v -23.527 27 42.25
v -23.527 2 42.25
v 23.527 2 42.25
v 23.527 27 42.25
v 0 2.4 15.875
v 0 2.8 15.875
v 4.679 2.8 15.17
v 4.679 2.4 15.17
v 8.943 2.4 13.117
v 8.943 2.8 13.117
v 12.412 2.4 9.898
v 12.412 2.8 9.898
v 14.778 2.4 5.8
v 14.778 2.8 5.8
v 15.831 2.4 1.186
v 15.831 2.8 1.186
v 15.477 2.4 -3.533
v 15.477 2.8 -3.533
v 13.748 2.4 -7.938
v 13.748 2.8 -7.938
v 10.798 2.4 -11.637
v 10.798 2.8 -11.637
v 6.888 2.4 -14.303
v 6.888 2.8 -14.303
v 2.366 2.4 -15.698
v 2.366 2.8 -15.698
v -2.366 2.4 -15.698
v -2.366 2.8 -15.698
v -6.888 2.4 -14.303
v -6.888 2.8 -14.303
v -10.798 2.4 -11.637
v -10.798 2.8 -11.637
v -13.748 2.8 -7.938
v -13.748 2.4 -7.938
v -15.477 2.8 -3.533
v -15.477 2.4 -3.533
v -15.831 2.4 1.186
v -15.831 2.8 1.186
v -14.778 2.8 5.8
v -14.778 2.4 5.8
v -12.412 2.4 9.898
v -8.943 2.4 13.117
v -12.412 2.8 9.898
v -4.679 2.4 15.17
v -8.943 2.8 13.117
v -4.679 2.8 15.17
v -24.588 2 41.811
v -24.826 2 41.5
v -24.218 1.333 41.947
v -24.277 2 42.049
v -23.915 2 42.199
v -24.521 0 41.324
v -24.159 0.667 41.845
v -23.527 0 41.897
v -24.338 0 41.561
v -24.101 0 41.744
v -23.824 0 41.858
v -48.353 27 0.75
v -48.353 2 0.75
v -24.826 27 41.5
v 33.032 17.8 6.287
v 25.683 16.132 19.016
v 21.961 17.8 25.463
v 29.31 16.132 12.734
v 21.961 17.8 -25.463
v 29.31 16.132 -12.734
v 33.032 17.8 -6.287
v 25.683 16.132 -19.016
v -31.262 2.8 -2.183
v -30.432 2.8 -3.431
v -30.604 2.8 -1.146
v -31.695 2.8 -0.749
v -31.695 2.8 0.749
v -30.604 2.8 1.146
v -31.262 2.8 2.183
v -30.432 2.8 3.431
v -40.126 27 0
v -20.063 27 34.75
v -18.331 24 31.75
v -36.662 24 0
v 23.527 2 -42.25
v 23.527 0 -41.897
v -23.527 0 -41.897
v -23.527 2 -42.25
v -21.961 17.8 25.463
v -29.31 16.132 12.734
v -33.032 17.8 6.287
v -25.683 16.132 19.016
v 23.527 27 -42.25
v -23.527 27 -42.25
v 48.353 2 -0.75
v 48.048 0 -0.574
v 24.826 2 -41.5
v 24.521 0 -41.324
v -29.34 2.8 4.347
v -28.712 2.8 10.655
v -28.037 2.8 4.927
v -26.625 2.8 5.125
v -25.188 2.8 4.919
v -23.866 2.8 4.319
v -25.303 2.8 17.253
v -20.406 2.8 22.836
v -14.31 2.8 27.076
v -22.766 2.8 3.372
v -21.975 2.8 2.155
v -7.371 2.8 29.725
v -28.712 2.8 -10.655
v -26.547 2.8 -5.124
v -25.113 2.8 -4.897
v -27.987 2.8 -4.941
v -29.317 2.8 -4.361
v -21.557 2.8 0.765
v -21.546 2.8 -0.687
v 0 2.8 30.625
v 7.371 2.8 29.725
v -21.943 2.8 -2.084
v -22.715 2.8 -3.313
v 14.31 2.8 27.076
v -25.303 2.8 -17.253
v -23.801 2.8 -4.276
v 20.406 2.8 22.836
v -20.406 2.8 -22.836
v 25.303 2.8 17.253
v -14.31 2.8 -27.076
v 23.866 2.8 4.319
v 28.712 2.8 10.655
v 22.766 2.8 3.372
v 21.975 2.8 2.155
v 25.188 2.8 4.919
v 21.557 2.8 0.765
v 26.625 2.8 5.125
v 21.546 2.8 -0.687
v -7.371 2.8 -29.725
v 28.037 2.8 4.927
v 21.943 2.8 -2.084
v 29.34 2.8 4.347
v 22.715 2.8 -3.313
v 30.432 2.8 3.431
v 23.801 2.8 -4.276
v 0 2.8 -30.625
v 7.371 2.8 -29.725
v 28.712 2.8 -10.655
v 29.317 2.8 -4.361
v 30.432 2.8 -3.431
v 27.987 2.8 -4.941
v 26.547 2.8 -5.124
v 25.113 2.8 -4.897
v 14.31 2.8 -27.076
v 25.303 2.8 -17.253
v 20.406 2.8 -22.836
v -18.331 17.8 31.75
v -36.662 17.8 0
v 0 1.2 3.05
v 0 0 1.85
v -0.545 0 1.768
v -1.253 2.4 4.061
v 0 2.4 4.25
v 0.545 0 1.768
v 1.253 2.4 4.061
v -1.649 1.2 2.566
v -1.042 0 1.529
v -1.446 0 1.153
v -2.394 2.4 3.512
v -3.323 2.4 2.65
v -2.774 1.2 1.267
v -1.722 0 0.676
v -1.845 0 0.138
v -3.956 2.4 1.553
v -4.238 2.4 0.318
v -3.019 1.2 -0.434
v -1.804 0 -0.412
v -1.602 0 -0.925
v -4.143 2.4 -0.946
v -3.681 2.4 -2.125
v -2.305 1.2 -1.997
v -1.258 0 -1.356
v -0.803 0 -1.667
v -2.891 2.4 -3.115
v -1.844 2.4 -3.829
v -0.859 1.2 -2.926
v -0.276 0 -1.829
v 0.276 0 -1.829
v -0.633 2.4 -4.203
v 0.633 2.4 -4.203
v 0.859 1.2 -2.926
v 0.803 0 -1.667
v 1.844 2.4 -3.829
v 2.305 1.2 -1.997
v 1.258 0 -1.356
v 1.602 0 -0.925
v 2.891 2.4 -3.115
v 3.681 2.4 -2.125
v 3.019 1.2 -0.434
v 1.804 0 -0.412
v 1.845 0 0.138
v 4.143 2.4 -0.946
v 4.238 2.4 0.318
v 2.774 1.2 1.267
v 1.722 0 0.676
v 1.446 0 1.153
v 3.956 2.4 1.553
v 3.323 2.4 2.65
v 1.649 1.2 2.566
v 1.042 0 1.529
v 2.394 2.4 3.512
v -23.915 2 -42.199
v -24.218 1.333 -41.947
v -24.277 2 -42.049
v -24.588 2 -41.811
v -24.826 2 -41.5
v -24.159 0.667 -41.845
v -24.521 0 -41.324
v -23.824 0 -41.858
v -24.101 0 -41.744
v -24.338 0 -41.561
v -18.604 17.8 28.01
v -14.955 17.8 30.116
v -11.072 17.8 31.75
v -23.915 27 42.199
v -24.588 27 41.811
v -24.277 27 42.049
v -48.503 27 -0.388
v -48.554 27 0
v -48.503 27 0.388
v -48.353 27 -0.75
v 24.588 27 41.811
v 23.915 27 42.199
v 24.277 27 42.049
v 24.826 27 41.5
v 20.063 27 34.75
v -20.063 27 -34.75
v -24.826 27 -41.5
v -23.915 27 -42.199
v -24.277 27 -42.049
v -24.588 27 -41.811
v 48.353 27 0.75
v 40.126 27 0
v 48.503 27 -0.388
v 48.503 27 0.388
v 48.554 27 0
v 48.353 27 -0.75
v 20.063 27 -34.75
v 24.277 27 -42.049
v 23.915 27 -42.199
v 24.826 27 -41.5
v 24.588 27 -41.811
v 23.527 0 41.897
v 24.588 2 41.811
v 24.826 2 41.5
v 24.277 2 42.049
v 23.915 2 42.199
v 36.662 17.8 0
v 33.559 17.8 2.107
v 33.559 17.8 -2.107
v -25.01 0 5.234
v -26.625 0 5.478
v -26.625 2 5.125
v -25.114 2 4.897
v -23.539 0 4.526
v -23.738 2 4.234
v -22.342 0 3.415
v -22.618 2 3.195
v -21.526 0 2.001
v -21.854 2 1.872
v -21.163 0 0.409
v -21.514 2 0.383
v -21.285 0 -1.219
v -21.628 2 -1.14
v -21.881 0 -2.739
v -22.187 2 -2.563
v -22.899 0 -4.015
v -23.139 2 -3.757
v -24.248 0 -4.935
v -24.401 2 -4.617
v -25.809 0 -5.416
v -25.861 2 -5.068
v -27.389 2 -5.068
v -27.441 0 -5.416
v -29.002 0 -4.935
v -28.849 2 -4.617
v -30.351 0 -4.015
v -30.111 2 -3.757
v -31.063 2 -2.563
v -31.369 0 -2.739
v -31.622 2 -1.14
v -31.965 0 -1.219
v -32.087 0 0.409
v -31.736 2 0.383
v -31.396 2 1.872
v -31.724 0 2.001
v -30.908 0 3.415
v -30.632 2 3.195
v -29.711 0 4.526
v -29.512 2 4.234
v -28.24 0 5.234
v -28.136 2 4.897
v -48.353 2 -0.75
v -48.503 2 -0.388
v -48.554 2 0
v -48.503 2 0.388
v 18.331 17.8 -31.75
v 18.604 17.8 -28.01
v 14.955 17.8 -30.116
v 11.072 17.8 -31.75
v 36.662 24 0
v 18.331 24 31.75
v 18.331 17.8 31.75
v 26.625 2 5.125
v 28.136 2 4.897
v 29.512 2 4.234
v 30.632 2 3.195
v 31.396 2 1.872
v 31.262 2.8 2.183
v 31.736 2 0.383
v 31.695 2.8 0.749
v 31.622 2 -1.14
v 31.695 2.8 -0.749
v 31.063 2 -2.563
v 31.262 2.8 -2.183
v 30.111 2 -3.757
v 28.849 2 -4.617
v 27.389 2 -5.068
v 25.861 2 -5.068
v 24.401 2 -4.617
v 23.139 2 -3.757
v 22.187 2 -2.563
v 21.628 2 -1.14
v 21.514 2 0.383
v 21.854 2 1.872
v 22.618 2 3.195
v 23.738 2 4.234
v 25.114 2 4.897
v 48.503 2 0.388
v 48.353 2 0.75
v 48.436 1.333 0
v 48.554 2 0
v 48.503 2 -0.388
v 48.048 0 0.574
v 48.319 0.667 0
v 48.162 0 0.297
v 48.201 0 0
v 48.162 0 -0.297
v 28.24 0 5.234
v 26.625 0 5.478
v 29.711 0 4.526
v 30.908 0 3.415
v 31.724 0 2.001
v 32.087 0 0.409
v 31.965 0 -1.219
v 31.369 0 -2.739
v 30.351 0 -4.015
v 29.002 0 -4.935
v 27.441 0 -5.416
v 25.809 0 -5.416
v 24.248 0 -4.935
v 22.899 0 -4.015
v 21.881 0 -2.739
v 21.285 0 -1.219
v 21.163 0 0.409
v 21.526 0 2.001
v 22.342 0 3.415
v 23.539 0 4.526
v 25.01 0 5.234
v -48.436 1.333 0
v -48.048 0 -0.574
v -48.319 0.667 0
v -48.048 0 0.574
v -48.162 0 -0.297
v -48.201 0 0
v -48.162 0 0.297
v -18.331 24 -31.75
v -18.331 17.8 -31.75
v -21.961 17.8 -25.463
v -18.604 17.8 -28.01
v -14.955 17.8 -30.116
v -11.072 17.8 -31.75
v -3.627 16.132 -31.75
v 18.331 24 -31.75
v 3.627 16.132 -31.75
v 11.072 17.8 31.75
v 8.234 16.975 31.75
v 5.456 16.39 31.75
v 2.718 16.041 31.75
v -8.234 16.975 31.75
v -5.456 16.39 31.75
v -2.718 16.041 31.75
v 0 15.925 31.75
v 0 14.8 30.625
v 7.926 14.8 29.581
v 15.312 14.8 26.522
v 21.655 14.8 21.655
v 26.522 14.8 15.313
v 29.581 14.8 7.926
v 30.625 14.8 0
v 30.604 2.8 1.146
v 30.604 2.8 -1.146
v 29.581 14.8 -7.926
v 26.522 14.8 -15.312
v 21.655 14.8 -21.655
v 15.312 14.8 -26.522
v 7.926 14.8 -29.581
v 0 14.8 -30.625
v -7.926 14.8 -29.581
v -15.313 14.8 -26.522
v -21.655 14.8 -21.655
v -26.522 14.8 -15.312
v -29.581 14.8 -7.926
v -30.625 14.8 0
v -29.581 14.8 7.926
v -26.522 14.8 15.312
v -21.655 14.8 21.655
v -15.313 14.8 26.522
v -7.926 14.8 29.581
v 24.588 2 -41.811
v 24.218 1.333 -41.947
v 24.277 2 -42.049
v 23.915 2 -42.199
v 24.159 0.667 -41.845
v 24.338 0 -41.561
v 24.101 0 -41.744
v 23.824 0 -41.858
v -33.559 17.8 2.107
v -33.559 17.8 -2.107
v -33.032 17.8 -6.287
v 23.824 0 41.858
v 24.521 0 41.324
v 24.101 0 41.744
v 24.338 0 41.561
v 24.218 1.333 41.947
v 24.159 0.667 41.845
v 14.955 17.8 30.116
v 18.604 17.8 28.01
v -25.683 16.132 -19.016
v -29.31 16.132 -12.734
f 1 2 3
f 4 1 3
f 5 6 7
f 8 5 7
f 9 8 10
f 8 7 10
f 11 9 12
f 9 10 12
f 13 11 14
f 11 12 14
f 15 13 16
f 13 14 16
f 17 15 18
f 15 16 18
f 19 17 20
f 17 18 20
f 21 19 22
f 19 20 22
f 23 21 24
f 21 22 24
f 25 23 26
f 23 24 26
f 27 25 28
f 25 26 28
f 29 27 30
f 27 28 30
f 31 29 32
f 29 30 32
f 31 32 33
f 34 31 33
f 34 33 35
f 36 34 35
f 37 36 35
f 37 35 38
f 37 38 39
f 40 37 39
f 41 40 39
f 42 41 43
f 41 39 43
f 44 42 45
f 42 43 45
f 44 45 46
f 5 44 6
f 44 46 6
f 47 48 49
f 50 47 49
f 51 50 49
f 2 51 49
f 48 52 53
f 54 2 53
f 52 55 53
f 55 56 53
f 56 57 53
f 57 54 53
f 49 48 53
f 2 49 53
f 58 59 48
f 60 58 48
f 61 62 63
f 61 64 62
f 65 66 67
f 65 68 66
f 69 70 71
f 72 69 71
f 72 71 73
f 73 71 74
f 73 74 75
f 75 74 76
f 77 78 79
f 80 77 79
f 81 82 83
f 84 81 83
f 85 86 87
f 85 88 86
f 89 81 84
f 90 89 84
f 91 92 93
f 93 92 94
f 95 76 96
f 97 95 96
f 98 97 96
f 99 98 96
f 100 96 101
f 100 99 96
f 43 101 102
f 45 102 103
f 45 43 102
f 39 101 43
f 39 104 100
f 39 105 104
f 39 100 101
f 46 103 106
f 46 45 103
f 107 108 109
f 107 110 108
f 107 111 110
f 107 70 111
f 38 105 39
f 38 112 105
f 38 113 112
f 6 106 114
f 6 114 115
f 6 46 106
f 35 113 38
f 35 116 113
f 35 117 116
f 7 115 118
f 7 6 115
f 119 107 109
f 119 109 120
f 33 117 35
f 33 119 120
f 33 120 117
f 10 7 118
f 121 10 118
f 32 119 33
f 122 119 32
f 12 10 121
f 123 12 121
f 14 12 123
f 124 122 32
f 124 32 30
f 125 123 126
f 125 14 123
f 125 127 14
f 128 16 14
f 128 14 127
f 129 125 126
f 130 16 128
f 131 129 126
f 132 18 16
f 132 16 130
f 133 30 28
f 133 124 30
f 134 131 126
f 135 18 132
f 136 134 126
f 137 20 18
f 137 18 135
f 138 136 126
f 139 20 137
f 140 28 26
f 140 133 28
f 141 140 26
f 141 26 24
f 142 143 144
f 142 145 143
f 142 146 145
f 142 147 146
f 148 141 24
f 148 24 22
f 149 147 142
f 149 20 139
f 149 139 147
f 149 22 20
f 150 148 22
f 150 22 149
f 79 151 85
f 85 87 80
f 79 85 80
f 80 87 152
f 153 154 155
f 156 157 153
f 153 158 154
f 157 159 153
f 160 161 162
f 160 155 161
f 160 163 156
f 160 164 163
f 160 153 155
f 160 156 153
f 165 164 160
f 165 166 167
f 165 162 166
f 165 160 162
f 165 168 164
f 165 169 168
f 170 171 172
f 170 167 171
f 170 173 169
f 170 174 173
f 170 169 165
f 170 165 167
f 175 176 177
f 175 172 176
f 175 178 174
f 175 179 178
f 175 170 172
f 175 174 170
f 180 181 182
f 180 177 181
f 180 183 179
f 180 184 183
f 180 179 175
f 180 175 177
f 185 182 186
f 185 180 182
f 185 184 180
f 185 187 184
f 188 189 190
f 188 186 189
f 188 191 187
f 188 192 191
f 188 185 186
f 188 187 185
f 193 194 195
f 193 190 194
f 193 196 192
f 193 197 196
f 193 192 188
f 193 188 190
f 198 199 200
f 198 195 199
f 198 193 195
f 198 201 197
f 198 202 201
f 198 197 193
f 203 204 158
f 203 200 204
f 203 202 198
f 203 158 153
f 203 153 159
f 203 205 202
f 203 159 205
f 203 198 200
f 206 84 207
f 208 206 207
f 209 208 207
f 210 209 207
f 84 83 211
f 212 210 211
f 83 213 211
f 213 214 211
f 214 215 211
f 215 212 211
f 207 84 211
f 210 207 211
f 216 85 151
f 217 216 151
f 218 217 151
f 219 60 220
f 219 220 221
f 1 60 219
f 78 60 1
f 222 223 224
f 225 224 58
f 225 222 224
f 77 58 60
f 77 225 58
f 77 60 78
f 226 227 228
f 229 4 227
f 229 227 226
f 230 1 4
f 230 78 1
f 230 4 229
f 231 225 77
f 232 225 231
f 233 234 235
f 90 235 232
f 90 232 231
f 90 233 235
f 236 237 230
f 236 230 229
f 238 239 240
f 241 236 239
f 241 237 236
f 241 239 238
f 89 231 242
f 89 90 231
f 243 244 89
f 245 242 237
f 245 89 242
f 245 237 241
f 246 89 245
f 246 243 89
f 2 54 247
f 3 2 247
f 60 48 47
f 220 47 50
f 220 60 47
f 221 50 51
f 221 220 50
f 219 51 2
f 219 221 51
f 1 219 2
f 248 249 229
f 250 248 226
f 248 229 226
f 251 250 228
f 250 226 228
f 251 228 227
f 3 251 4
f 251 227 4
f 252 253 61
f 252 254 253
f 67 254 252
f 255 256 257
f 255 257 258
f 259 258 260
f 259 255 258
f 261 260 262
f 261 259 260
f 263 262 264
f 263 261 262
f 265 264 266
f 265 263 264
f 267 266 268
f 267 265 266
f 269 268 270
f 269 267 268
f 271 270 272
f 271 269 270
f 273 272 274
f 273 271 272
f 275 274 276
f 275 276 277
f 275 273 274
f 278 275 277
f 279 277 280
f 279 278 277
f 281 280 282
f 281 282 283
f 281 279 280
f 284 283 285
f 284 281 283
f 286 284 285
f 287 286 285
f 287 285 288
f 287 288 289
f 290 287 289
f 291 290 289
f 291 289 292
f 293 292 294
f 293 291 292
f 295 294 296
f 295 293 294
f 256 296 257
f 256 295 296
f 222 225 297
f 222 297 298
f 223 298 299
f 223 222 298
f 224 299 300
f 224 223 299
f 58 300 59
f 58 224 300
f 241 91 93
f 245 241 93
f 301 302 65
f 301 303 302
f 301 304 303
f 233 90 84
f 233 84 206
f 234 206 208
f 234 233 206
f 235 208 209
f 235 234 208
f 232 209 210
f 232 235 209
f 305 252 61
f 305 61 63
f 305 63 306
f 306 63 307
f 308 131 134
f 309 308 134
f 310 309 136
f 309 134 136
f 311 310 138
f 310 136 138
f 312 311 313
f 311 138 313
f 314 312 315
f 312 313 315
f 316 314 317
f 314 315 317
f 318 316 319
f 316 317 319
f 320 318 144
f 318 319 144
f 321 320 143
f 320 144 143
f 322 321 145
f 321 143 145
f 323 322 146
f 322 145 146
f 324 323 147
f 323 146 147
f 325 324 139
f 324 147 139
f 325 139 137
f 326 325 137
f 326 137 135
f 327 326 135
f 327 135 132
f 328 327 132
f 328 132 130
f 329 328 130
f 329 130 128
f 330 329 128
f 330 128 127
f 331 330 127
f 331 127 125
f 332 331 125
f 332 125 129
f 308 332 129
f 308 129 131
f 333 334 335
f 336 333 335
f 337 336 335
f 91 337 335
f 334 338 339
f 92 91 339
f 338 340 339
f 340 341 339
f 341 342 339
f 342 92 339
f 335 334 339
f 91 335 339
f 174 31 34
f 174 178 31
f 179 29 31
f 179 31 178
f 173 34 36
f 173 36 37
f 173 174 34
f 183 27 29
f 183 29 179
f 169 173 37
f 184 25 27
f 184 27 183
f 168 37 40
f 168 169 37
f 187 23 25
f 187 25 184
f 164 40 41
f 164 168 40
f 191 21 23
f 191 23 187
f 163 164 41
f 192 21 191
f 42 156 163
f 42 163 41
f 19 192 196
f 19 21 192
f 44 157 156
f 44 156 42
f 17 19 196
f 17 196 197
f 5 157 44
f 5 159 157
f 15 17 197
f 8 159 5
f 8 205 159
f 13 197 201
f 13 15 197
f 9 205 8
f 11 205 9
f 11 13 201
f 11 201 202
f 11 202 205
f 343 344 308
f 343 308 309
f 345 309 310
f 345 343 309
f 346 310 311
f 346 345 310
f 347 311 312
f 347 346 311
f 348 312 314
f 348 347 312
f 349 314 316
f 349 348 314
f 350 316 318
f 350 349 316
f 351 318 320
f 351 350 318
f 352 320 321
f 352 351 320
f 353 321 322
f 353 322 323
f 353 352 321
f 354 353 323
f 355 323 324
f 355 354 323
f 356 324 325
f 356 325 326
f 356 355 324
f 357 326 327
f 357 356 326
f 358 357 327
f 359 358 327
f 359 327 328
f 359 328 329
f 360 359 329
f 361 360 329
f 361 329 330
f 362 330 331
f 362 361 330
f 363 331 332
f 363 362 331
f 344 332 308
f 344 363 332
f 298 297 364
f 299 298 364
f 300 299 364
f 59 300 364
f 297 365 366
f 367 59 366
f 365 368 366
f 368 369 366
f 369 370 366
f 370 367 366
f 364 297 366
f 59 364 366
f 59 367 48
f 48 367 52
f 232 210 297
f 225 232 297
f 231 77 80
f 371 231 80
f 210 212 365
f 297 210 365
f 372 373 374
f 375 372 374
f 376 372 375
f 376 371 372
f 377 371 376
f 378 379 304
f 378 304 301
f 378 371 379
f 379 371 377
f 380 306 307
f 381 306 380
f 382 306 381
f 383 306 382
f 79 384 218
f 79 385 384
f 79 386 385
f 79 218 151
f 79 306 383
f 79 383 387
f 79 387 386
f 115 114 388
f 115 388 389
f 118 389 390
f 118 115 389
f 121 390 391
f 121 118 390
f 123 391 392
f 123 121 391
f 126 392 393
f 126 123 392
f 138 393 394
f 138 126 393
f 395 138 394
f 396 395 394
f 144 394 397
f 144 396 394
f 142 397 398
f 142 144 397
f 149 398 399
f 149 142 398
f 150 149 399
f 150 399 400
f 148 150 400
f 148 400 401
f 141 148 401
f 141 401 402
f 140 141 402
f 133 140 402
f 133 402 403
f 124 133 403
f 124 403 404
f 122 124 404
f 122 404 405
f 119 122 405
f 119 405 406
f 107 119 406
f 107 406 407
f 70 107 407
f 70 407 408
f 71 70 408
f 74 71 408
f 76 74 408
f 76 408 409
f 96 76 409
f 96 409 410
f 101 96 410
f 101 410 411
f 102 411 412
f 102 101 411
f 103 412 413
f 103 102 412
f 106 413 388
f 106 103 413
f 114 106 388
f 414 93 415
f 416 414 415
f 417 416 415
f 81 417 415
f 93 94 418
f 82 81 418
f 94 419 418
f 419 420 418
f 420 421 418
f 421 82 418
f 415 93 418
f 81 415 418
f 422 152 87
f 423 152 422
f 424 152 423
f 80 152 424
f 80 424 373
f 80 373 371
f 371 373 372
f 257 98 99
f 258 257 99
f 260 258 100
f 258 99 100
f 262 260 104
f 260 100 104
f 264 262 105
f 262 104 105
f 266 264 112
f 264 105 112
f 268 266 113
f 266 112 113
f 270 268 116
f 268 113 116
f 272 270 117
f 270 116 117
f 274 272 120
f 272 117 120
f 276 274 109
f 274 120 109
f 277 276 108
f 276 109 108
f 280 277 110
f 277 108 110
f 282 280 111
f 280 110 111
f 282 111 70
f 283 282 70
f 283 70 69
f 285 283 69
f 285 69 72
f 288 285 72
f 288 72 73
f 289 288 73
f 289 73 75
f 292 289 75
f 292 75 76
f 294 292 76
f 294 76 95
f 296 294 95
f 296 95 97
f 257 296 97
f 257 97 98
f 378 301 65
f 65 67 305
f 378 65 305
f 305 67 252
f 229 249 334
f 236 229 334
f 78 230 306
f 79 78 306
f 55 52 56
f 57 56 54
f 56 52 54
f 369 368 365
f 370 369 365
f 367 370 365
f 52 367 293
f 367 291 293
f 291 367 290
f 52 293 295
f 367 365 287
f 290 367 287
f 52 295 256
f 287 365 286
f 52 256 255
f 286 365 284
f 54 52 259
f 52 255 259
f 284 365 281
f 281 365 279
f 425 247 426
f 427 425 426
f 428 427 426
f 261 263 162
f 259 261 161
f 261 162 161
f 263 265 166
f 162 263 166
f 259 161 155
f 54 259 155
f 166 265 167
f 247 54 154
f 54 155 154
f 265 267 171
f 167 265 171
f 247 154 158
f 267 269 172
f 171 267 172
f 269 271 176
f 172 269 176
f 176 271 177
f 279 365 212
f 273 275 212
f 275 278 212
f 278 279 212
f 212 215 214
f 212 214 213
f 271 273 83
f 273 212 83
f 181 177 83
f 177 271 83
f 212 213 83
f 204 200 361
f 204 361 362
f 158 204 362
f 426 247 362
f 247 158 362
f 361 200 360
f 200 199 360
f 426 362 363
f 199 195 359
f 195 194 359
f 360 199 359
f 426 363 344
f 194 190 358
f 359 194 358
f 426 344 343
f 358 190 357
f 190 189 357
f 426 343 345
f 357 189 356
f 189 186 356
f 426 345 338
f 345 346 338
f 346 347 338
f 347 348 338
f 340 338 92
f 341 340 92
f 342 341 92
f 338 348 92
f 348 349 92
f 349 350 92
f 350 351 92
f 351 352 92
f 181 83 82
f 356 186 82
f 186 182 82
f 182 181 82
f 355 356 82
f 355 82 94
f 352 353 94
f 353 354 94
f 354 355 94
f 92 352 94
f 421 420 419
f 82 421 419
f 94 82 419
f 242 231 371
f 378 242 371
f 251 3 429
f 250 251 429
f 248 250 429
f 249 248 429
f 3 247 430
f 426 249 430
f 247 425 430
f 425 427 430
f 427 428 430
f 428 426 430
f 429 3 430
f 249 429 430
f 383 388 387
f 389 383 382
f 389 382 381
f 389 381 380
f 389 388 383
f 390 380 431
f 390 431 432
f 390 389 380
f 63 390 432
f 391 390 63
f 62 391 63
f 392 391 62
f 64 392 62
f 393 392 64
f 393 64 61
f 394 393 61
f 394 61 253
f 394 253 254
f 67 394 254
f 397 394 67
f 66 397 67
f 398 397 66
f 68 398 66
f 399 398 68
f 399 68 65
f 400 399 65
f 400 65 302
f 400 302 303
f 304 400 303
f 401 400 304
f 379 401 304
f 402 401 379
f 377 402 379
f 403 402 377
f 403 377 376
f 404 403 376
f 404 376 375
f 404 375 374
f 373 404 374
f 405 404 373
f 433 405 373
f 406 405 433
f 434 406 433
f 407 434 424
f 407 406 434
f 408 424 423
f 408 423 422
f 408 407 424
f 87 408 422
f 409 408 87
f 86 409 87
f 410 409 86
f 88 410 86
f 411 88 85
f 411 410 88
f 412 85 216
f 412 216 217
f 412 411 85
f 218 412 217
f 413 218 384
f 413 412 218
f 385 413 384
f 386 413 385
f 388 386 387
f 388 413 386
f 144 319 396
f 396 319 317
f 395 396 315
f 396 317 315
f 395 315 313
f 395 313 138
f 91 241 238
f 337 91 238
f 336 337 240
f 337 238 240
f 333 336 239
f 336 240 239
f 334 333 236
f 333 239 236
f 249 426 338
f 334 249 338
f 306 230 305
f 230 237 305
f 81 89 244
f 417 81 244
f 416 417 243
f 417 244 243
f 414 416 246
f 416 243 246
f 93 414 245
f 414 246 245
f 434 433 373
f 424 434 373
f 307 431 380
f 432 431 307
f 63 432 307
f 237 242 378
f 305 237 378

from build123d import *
from OCP.BRepFilletAPI import BRepFilletAPI_MakeChamfer

# Parameters (mm, degrees)
BOSS_EXTRUDE1_DEPTH = 27
SKETCH1_5_R         = 1.25
BOSS_EXTRUDE2_DEPTH = 2.8
BOSS_EXTRUDE3_START = 2.8
SKETCH1_6_R         = 30.625
BOSS_EXTRUDE3_DEPTH = 15
CUT_EXTRUDE2_START  = 2.8
SKETCH1_8_R         = 5.125
CUT_EXTRUDE2_DEPTH  = 10
CUT_EXTRUDE1_START  = 2.8
SKETCH1_7_R         = 15.875
CUT_EXTRUDE1_DEPTH  = 0.4
CHAMFER1_SIZE       = 3
FILLET1_R           = 1.5
CHAMFER2_SIZE       = 3
CHAMFER3_SIZE       = 2
CHAMFER3_SIZE2      = 0.352653961
CHAMFER4_SIZE       = 2
CHAMFER4_SIZE2      = 0.352653961


with BuildPart() as part:
    # Sketch1 → Boss-Extrude1 (new body)
    with BuildSketch(Plane(origin=(0, 0, 0), x_dir=(1, 0, 0), z_dir=(0, 1, 0))):
        Polygon((-36.661742094, 0), (-18.330871047, 31.75), (-24.393048873, 42.25), (-48.786097747, 0), (-24.393048873, -42.25), (24.393048873, -42.25), (48.786097747, 0), (36.661742094, 0), (18.330871047, -31.75), (-18.330871047, -31.75), align=None)
        Polygon((-24.393048873, 42.25), (-18.330871047, 31.75), (18.330871047, 31.75), (24.393048873, 42.25), align=None)
        Polygon((24.393048873, 42.25), (18.330871047, 31.75), (36.661742094, 0), (48.786097747, 0), align=None)
    extrude(amount=BOSS_EXTRUDE1_DEPTH)

    # Sketch1<5> → Boss-Extrude2 (add)
    with BuildSketch(Plane(origin=(0, 0, 0), x_dir=(1, 0, 0), z_dir=(0, 1, 0))):
        Polygon((18.330871047, 31.75), (-18.330871047, 31.75), (-36.661742094, 0), (-18.330871047, -31.75), (18.330871047, -31.75), (36.661742094, 0), align=None)
        with Locations(Location((0, 0, 0), (0, 0, 270))):
            Circle(SKETCH1_5_R, mode=Mode.SUBTRACT)
    extrude(amount=BOSS_EXTRUDE2_DEPTH)

    # Sketch1<6> → Boss-Extrude3 (add)
    with BuildSketch(Plane(origin=(0, 0, 0), x_dir=(1, 0, 0), z_dir=(0, 1, 0)).offset(BOSS_EXTRUDE3_START)):
        Polygon((18.330871047, 31.75), (-18.330871047, 31.75), (-36.661742094, 0), (-18.330871047, -31.75), (18.330871047, -31.75), (36.661742094, 0), align=None)
        with Locations(Location((0, 0, 0), (0, 0, 270))):
            Circle(SKETCH1_6_R, mode=Mode.SUBTRACT)
    extrude(amount=BOSS_EXTRUDE3_DEPTH)

    # Sketch1<8> → Cut-Extrude2 (cut)
    with BuildSketch(Plane(origin=(0, 0, 0), x_dir=(1, 0, 0), z_dir=(0, 1, 0)).offset(CUT_EXTRUDE2_START)):
        with Locations(Location((26.625, 0, 0), (0, 0, 270))):
            Circle(SKETCH1_8_R)
        with Locations(Location((-26.625, 0, 0), (0, 0, 270))):
            Circle(SKETCH1_8_R)
    extrude(amount=-CUT_EXTRUDE2_DEPTH, mode=Mode.SUBTRACT)

    # Sketch1<7> → Cut-Extrude1 (cut)
    with BuildSketch(Plane(origin=(0, 0, 0), x_dir=(1, 0, 0), z_dir=(0, 1, 0)).offset(CUT_EXTRUDE1_START)):
        with Locations(Location((0, 0, 0), (0, 0, 270))):
            Circle(SKETCH1_7_R)
    extrude(amount=-CUT_EXTRUDE1_DEPTH, mode=Mode.SUBTRACT)

    # Chamfer1
    # the kernel refuses this chamfer: 3 mm, written as the material it takes off along each edge
    with BuildSketch(Plane(origin=(26.045920011, 27, 31.75), x_dir=(0, 0.027495876610586768, 0.9996219169112968), z_dir=(-1, 0, 0))) as chamfer1_piece_1_section:
        Polygon((CHAMFER1_SIZE * 0.999621916911, -CHAMFER1_SIZE * 0.0274958766106), (-CHAMFER1_SIZE * 0.0274958766106, -CHAMFER1_SIZE * 0.999621916911), (0, 0), align=None)
    chamfer1_piece_1 = extrude(amount=52.091840021, mode=Mode.PRIVATE)
    chamfer1_piece_1 = split(chamfer1_piece_1, bisect_by=Plane(origin=(13.32778404, 26.000686335, 40.41560089), z_dir=(-0.8660254037844387, 0, -0.5000000000000001)), keep=Keep.TOP, mode=Mode.PRIVATE)
    chamfer1_piece_1 = split(chamfer1_piece_1, bisect_by=Plane(origin=(-13.32778404, 26.000686335, 40.41560089), z_dir=(0.8660254037844386, 0, -0.5000000000000002)), keep=Keep.TOP, mode=Mode.PRIVATE)
    add(chamfer1_piece_1, mode=Mode.SUBTRACT)
    with BuildSketch(Plane(origin=(-14.473346565, 27, 38.431428394), x_dir=(-0.8656979742248803, 0.02749587661058676, 0.4998109584556486), z_dir=(-0.5000000000000002, 0, -0.8660254037844386))) as chamfer1_piece_2_section:
        Polygon((CHAMFER1_SIZE * 0.999621916911, -CHAMFER1_SIZE * 0.0274958766106), (-CHAMFER1_SIZE * 0.0274958766106, -CHAMFER1_SIZE * 0.999621916911), (0, 0), align=None)
    chamfer1_piece_2 = extrude(amount=52.091840021, mode=Mode.PRIVATE)
    chamfer1_piece_2 = split(chamfer1_piece_2, bisect_by=Plane(origin=(-28.33704506, 26.000686335, 31.75), z_dir=(0, 0, -1)), keep=Keep.TOP, mode=Mode.PRIVATE)
    chamfer1_piece_2 = split(chamfer1_piece_2, bisect_by=Plane(origin=(-41.6648291, 26.000686335, 8.66560089), z_dir=(0.8660254037844387, 0, 0.5000000000000001)), keep=Keep.TOP, mode=Mode.PRIVATE)
    add(chamfer1_piece_2, mode=Mode.SUBTRACT)
    with BuildSketch(Plane(origin=(-40.519266575, 27, 6.681428394), x_dir=(-0.8656979742248804, 0.02749587661058679, -0.49981095845564844), z_dir=(0.5000000000000001, 0, -0.8660254037844387))) as chamfer1_piece_3_section:
        Polygon((CHAMFER1_SIZE * 0.999621916911, -CHAMFER1_SIZE * 0.0274958766106), (-CHAMFER1_SIZE * 0.0274958766106, -CHAMFER1_SIZE * 0.999621916911), (0, 0), align=None)
    chamfer1_piece_3 = extrude(amount=52.091840021, mode=Mode.PRIVATE)
    chamfer1_piece_3 = split(chamfer1_piece_3, bisect_by=Plane(origin=(-41.6648291, 26.000686335, -8.66560089), z_dir=(0.8660254037844386, 0, -0.5000000000000002)), keep=Keep.TOP, mode=Mode.PRIVATE)
    chamfer1_piece_3 = split(chamfer1_piece_3, bisect_by=Plane(origin=(-28.33704506, 26.000686335, -31.75), z_dir=(0, 0, 1)), keep=Keep.TOP, mode=Mode.PRIVATE)
    add(chamfer1_piece_3, mode=Mode.SUBTRACT)
    with BuildSketch(Plane(origin=(-26.045920011, 27, -31.75), x_dir=(0, 0.027495876610586733, -0.9996219169112968), z_dir=(1, 0, 0))) as chamfer1_piece_4_section:
        Polygon((CHAMFER1_SIZE * 0.999621916911, -CHAMFER1_SIZE * 0.0274958766106), (-CHAMFER1_SIZE * 0.0274958766106, -CHAMFER1_SIZE * 0.999621916911), (0, 0), align=None)
    chamfer1_piece_4 = extrude(amount=52.091840021, mode=Mode.PRIVATE)
    chamfer1_piece_4 = split(chamfer1_piece_4, bisect_by=Plane(origin=(-13.32778404, 26.000686335, -40.41560089), z_dir=(0.8660254037844387, 0, 0.5000000000000001)), keep=Keep.TOP, mode=Mode.PRIVATE)
    chamfer1_piece_4 = split(chamfer1_piece_4, bisect_by=Plane(origin=(13.32778404, 26.000686335, -40.41560089), z_dir=(-0.8660254037844385, 0, 0.5000000000000004)), keep=Keep.TOP, mode=Mode.PRIVATE)
    add(chamfer1_piece_4, mode=Mode.SUBTRACT)
    with BuildSketch(Plane(origin=(14.473346565, 27, -38.431428394), x_dir=(0.86569797422488, 0.02749587661058676, -0.4998109584556487), z_dir=(0.5000000000000004, 0, 0.8660254037844385))) as chamfer1_piece_5_section:
        Polygon((CHAMFER1_SIZE * 0.999621916911, -CHAMFER1_SIZE * 0.0274958766106), (-CHAMFER1_SIZE * 0.0274958766106, -CHAMFER1_SIZE * 0.999621916911), (0, 0), align=None)
    chamfer1_piece_5 = extrude(amount=52.091840021, mode=Mode.PRIVATE)
    chamfer1_piece_5 = split(chamfer1_piece_5, bisect_by=Plane(origin=(41.6648291, 26.000686335, -8.66560089), z_dir=(-0.8660254037844387, 0, -0.5000000000000001)), keep=Keep.TOP, mode=Mode.PRIVATE)
    chamfer1_piece_5 = split(chamfer1_piece_5, bisect_by=Plane(origin=(28.33704506, 26.000686335, -31.75), z_dir=(0, 0, 1)), keep=Keep.TOP, mode=Mode.PRIVATE)
    add(chamfer1_piece_5, mode=Mode.SUBTRACT)
    with BuildSketch(Plane(origin=(40.519266575, 27, -6.681428394), x_dir=(0.8656979742248803, 0.02749587661058679, 0.4998109584556484), z_dir=(-0.5000000000000001, 0, 0.8660254037844387))) as chamfer1_piece_6_section:
        Polygon((CHAMFER1_SIZE * 0.999621916911, -CHAMFER1_SIZE * 0.0274958766106), (-CHAMFER1_SIZE * 0.0274958766106, -CHAMFER1_SIZE * 0.999621916911), (0, 0), align=None)
    chamfer1_piece_6 = extrude(amount=52.091840021, mode=Mode.PRIVATE)
    chamfer1_piece_6 = split(chamfer1_piece_6, bisect_by=Plane(origin=(28.33704506, 26.000686335, 31.75), z_dir=(0, 0, -1)), keep=Keep.TOP, mode=Mode.PRIVATE)
    chamfer1_piece_6 = split(chamfer1_piece_6, bisect_by=Plane(origin=(41.6648291, 26.000686335, 8.66560089), z_dir=(-0.8660254037844385, 0, 0.5000000000000004)), keep=Keep.TOP, mode=Mode.PRIVATE)
    add(chamfer1_piece_6, mode=Mode.SUBTRACT)
    with BuildSketch(Plane(origin=(0, 17.8, 0), x_dir=(0, 0, 1), z_dir=(-1, 0, 0))) as chamfer1_piece_7_section:
        Polygon((30.625 + CHAMFER1_SIZE, 0), (30.625, -CHAMFER1_SIZE), (30.625, 0), align=None)
    chamfer1_piece_7 = revolve(axis=Axis((0, 17.8, 0), (0, 1, 0)), mode=Mode.PRIVATE)
    chamfer1_piece_7 = split(chamfer1_piece_7, bisect_by=Plane(origin=(27.49630657, 15.310214491, 15.875), z_dir=(-0.8660254037844387, 0, -0.5000000000000001)), keep=Keep.TOP, mode=Mode.PRIVATE)
    chamfer1_piece_7 = split(chamfer1_piece_7, bisect_by=Plane(origin=(26.848215095, 15.310214491, 31.75), z_dir=(0, 0, -1)), keep=Keep.TOP, mode=Mode.PRIVATE)
    chamfer1_piece_7 = split(chamfer1_piece_7, bisect_by=Plane(origin=(-14.072199023, 15.310214491, 39.126236318), z_dir=(0.8660254037844386, 0, -0.5000000000000002)), keep=Keep.TOP, mode=Mode.PRIVATE)
    chamfer1_piece_7 = split(chamfer1_piece_7, bisect_by=Plane(origin=(-27.49630657, 15.310214491, -15.875), z_dir=(0.8660254037844387, 0, 0.5000000000000001)), keep=Keep.TOP, mode=Mode.PRIVATE)
    chamfer1_piece_7 = split(chamfer1_piece_7, bisect_by=Plane(origin=(26.848215095, 15.310214491, -31.75), z_dir=(0, 0, 1)), keep=Keep.TOP, mode=Mode.PRIVATE)
    chamfer1_piece_7 = split(chamfer1_piece_7, bisect_by=Plane(origin=(40.920414118, 15.310214491, 7.376236318), z_dir=(-0.8660254037844385, 0, 0.5000000000000004)), keep=Keep.TOP, mode=Mode.PRIVATE)
    add(chamfer1_piece_7, mode=Mode.SUBTRACT)
    with BuildSketch(Plane(origin=(40.519266575, 27, -6.681428394), x_dir=(0.8656979742248803, 0.02749587661058679, 0.4998109584556484), z_dir=(-0.5000000000000001, 0, 0.8660254037844387))) as chamfer1_piece_8a_section:
        Polygon((CHAMFER1_SIZE * 0.999621916911, -CHAMFER1_SIZE * 0.0274958766106), (-CHAMFER1_SIZE * 0.0274958766106, -CHAMFER1_SIZE * 0.999621916911), (0, 0), align=None)
    chamfer1_piece_8a = extrude(amount=52.091840021, mode=Mode.PRIVATE)
    chamfer1_piece_8a = split(chamfer1_piece_8a, bisect_by=Plane(origin=(17.441976447, 26.031907688, 31.75), z_dir=(0, 0, 1)), keep=Keep.TOP, mode=Mode.PRIVATE)
    with BuildSketch(Plane(origin=(26.045920011, 27, 31.75), x_dir=(0, 0.027495876610586768, 0.9996219169112968), z_dir=(-1, 0, 0))) as chamfer1_piece_8b_section:
        Polygon((CHAMFER1_SIZE * 0.999621916911, -CHAMFER1_SIZE * 0.0274958766106), (-CHAMFER1_SIZE * 0.0274958766106, -CHAMFER1_SIZE * 0.999621916911), (0, 0), align=None)
    chamfer1_piece_8b = extrude(amount=52.091840021, mode=Mode.PRIVATE)
    chamfer1_piece_8b = split(chamfer1_piece_8b, bisect_by=Plane(origin=(18.775318347, 26.031907688, 30.980194695), z_dir=(0.8660254037844387, 0, 0.5000000000000001)), keep=Keep.TOP, mode=Mode.PRIVATE)
    chamfer1_piece_8 = chamfer1_piece_8a & chamfer1_piece_8b
    add(chamfer1_piece_8, mode=Mode.SUBTRACT)
    with BuildSketch(Plane(origin=(26.045920011, 27, 31.75), x_dir=(0, 0.027495876610586768, 0.9996219169112968), z_dir=(-1, 0, 0))) as chamfer1_piece_9a_section:
        Polygon((CHAMFER1_SIZE * 0.999621916911, -CHAMFER1_SIZE * 0.0274958766106), (-CHAMFER1_SIZE * 0.0274958766106, -CHAMFER1_SIZE * 0.999621916911), (0, 0), align=None)
    chamfer1_piece_9a = extrude(amount=52.091840021, mode=Mode.PRIVATE)
    chamfer1_piece_9a = split(chamfer1_piece_9a, bisect_by=Plane(origin=(-18.775318347, 26.031907688, 30.980194695), z_dir=(-0.8660254037844386, 0, 0.5000000000000002)), keep=Keep.TOP, mode=Mode.PRIVATE)
    with BuildSketch(Plane(origin=(-14.473346565, 27, 38.431428394), x_dir=(-0.8656979742248803, 0.02749587661058676, 0.4998109584556486), z_dir=(-0.5000000000000002, 0, -0.8660254037844386))) as chamfer1_piece_9b_section:
        Polygon((CHAMFER1_SIZE * 0.999621916911, -CHAMFER1_SIZE * 0.0274958766106), (-CHAMFER1_SIZE * 0.0274958766106, -CHAMFER1_SIZE * 0.999621916911), (0, 0), align=None)
    chamfer1_piece_9b = extrude(amount=52.091840021, mode=Mode.PRIVATE)
    chamfer1_piece_9b = split(chamfer1_piece_9b, bisect_by=Plane(origin=(-17.441976447, 26.031907688, 31.75), z_dir=(0, 0, 1)), keep=Keep.TOP, mode=Mode.PRIVATE)
    chamfer1_piece_9 = chamfer1_piece_9a & chamfer1_piece_9b
    add(chamfer1_piece_9, mode=Mode.SUBTRACT)
    with BuildSketch(Plane(origin=(-14.473346565, 27, 38.431428394), x_dir=(-0.8656979742248803, 0.02749587661058676, 0.4998109584556486), z_dir=(-0.5000000000000002, 0, -0.8660254037844386))) as chamfer1_piece_10a_section:
        Polygon((CHAMFER1_SIZE * 0.999621916911, -CHAMFER1_SIZE * 0.0274958766106), (-CHAMFER1_SIZE * 0.0274958766106, -CHAMFER1_SIZE * 0.999621916911), (0, 0), align=None)
    chamfer1_piece_10a = extrude(amount=52.091840021, mode=Mode.PRIVATE)
    chamfer1_piece_10a = split(chamfer1_piece_10a, bisect_by=Plane(origin=(-36.217294794, 26.031907688, -0.769805305), z_dir=(-0.8660254037844387, 0, -0.5000000000000001)), keep=Keep.TOP, mode=Mode.PRIVATE)
    with BuildSketch(Plane(origin=(-40.519266575, 27, 6.681428394), x_dir=(-0.8656979742248804, 0.02749587661058679, -0.49981095845564844), z_dir=(0.5000000000000001, 0, -0.8660254037844387))) as chamfer1_piece_10b_section:
        Polygon((CHAMFER1_SIZE * 0.999621916911, -CHAMFER1_SIZE * 0.0274958766106), (-CHAMFER1_SIZE * 0.0274958766106, -CHAMFER1_SIZE * 0.999621916911), (0, 0), align=None)
    chamfer1_piece_10b = extrude(amount=52.091840021, mode=Mode.PRIVATE)
    chamfer1_piece_10b = split(chamfer1_piece_10b, bisect_by=Plane(origin=(-36.217294794, 26.031907688, 0.769805305), z_dir=(-0.8660254037844386, 0, 0.5000000000000002)), keep=Keep.TOP, mode=Mode.PRIVATE)
    chamfer1_piece_10 = chamfer1_piece_10a & chamfer1_piece_10b
    add(chamfer1_piece_10, mode=Mode.SUBTRACT)
    with BuildSketch(Plane(origin=(-40.519266575, 27, 6.681428394), x_dir=(-0.8656979742248804, 0.02749587661058679, -0.49981095845564844), z_dir=(0.5000000000000001, 0, -0.8660254037844387))) as chamfer1_piece_11a_section:
        Polygon((CHAMFER1_SIZE * 0.999621916911, -CHAMFER1_SIZE * 0.0274958766106), (-CHAMFER1_SIZE * 0.0274958766106, -CHAMFER1_SIZE * 0.999621916911), (0, 0), align=None)
    chamfer1_piece_11a = extrude(amount=52.091840021, mode=Mode.PRIVATE)
    chamfer1_piece_11a = split(chamfer1_piece_11a, bisect_by=Plane(origin=(-17.441976447, 26.031907688, -31.75), z_dir=(0, 0, -1)), keep=Keep.TOP, mode=Mode.PRIVATE)
    with BuildSketch(Plane(origin=(-26.045920011, 27, -31.75), x_dir=(0, 0.027495876610586733, -0.9996219169112968), z_dir=(1, 0, 0))) as chamfer1_piece_11b_section:
        Polygon((CHAMFER1_SIZE * 0.999621916911, -CHAMFER1_SIZE * 0.0274958766106), (-CHAMFER1_SIZE * 0.0274958766106, -CHAMFER1_SIZE * 0.999621916911), (0, 0), align=None)
    chamfer1_piece_11b = extrude(amount=52.091840021, mode=Mode.PRIVATE)
    chamfer1_piece_11b = split(chamfer1_piece_11b, bisect_by=Plane(origin=(-18.775318347, 26.031907688, -30.980194695), z_dir=(-0.8660254037844387, 0, -0.5000000000000001)), keep=Keep.TOP, mode=Mode.PRIVATE)
    chamfer1_piece_11 = chamfer1_piece_11a & chamfer1_piece_11b
    add(chamfer1_piece_11, mode=Mode.SUBTRACT)
    with BuildSketch(Plane(origin=(-26.045920011, 27, -31.75), x_dir=(0, 0.027495876610586733, -0.9996219169112968), z_dir=(1, 0, 0))) as chamfer1_piece_12a_section:
        Polygon((CHAMFER1_SIZE * 0.999621916911, -CHAMFER1_SIZE * 0.0274958766106), (-CHAMFER1_SIZE * 0.0274958766106, -CHAMFER1_SIZE * 0.999621916911), (0, 0), align=None)
    chamfer1_piece_12a = extrude(amount=52.091840021, mode=Mode.PRIVATE)
    chamfer1_piece_12a = split(chamfer1_piece_12a, bisect_by=Plane(origin=(18.775318347, 26.031907688, -30.980194695), z_dir=(0.8660254037844385, 0, -0.5000000000000004)), keep=Keep.TOP, mode=Mode.PRIVATE)
    with BuildSketch(Plane(origin=(14.473346565, 27, -38.431428394), x_dir=(0.86569797422488, 0.02749587661058676, -0.4998109584556487), z_dir=(0.5000000000000004, 0, 0.8660254037844385))) as chamfer1_piece_12b_section:
        Polygon((CHAMFER1_SIZE * 0.999621916911, -CHAMFER1_SIZE * 0.0274958766106), (-CHAMFER1_SIZE * 0.0274958766106, -CHAMFER1_SIZE * 0.999621916911), (0, 0), align=None)
    chamfer1_piece_12b = extrude(amount=52.091840021, mode=Mode.PRIVATE)
    chamfer1_piece_12b = split(chamfer1_piece_12b, bisect_by=Plane(origin=(17.441976447, 26.031907688, -31.75), z_dir=(0, 0, -1)), keep=Keep.TOP, mode=Mode.PRIVATE)
    chamfer1_piece_12 = chamfer1_piece_12a & chamfer1_piece_12b
    add(chamfer1_piece_12, mode=Mode.SUBTRACT)
    with BuildSketch(Plane(origin=(40.519266575, 27, -6.681428394), x_dir=(0.8656979742248803, 0.02749587661058679, 0.4998109584556484), z_dir=(-0.5000000000000001, 0, 0.8660254037844387))) as chamfer1_piece_13a_section:
        Polygon((CHAMFER1_SIZE * 0.999621916911, -CHAMFER1_SIZE * 0.0274958766106), (-CHAMFER1_SIZE * 0.0274958766106, -CHAMFER1_SIZE * 0.999621916911), (0, 0), align=None)
    chamfer1_piece_13a = extrude(amount=52.091840021, mode=Mode.PRIVATE)
    chamfer1_piece_13a = split(chamfer1_piece_13a, bisect_by=Plane(origin=(36.217294794, 26.031907688, -0.769805305), z_dir=(0.8660254037844385, 0, -0.5000000000000004)), keep=Keep.TOP, mode=Mode.PRIVATE)
    with BuildSketch(Plane(origin=(14.473346565, 27, -38.431428394), x_dir=(0.86569797422488, 0.02749587661058676, -0.4998109584556487), z_dir=(0.5000000000000004, 0, 0.8660254037844385))) as chamfer1_piece_13b_section:
        Polygon((CHAMFER1_SIZE * 0.999621916911, -CHAMFER1_SIZE * 0.0274958766106), (-CHAMFER1_SIZE * 0.0274958766106, -CHAMFER1_SIZE * 0.999621916911), (0, 0), align=None)
    chamfer1_piece_13b = extrude(amount=52.091840021, mode=Mode.PRIVATE)
    chamfer1_piece_13b = split(chamfer1_piece_13b, bisect_by=Plane(origin=(36.217294794, 26.031907688, 0.769805305), z_dir=(0.8660254037844387, 0, 0.5000000000000001)), keep=Keep.TOP, mode=Mode.PRIVATE)
    chamfer1_piece_13 = chamfer1_piece_13a & chamfer1_piece_13b
    add(chamfer1_piece_13, mode=Mode.SUBTRACT)

    # Fillet1
    fillet1_edges = [part.edges().sort_by_distance(p)[0] for p in [
        (-24.393048873, 13.5, 42.25),
        (-48.786097747, 13.5, 0),
        (-24.393048873, 13.5, -42.25),
        (24.393048873, 13.5, -42.25),
        (48.786097747, 13.5, 0),
        (24.393048873, 13.5, 42.25),
    ]]
    fillet(fillet1_edges, radius=FILLET1_R)

    # Chamfer2
    # the kernel refuses this chamfer: 3 mm, written as the material it takes off along each edge
    with BuildSketch(Plane(origin=(0, 2.4, 0), x_dir=(0, 0, 1), z_dir=(1, 0, 0))) as chamfer2_piece_1:
        Polygon((1.25, CHAMFER2_SIZE), (1.25 + CHAMFER2_SIZE, 0), (1.25, 0), align=None)
    revolve(axis=Axis((0, 2.4, 0), (0, -1, 0)), mode=Mode.SUBTRACT)

    # Chamfer3: one chamfer whose edges measure the first distance from different faces: ONE call of the kernel's chamfer builder (chamfer() names one face for all edges)
    chamfer3_edges_1 = [part.edges().sort_by_distance(p)[0] for p in [
        (-26.625, 0, -5.125),
    ]]
    chamfer3_side_1 = [part.faces().sort_by_distance(p)[0] for p in [
        (-26.625, 1.4, -5.125),
    ]]
    chamfer3_edges_2 = [part.edges().sort_by_distance(p)[0] for p in [
        (26.625, 0, -5.125),
    ]]
    chamfer3_side_2 = [part.faces().sort_by_distance(p)[0] for p in [
        (26.625, 1.4, -5.125),
    ]]
    chamfer3 = BRepFilletAPI_MakeChamfer(part.part.solid().wrapped)
    for e in chamfer3_edges_1:
        chamfer3.Add(CHAMFER3_SIZE, CHAMFER3_SIZE2, e.wrapped, chamfer3_side_1[0].wrapped)  # the first distance lies on this face
    for e in chamfer3_edges_2:
        chamfer3.Add(CHAMFER3_SIZE, CHAMFER3_SIZE2, e.wrapped, chamfer3_side_2[0].wrapped)  # the first distance lies on this face
    add(Compound.cast(chamfer3.Shape()), mode=Mode.REPLACE)

    # Chamfer4: one chamfer whose edges measure the first distance from different faces: ONE call of the kernel's chamfer builder (chamfer() names one face for all edges)
    chamfer4_edges_1 = [part.edges().sort_by_distance(p)[0] for p in [
        (0, 0, -42.25),
    ]]
    chamfer4_side_1 = [part.faces().sort_by_distance(p)[0] for p in [
        (0, 13.5, -42.25),
    ]]
    chamfer4_edges_2 = [part.edges().sort_by_distance(p)[0] for p in [
        (0, 0, 42.25),
    ]]
    chamfer4_side_2 = [part.faces().sort_by_distance(p)[0] for p in [
        (0, 13.5, 42.25),
    ]]
    chamfer4_edges_3 = [part.edges().sort_by_distance(p)[0] for p in [
        (-36.58957331, 0, 21.125),
    ]]
    chamfer4_side_3 = [part.faces().sort_by_distance(p)[0] for p in [
        (-36.58957331, 13.5, 21.125),
    ]]
    chamfer4_edges_4 = [part.edges().sort_by_distance(p)[0] for p in [
        (-36.58957331, 0, -21.125),
    ]]
    chamfer4_side_4 = [part.faces().sort_by_distance(p)[0] for p in [
        (-36.58957331, 13.5, -21.125),
    ]]
    chamfer4_edges_5 = [part.edges().sort_by_distance(p)[0] for p in [
        (36.58957331, 0, -21.125),
    ]]
    chamfer4_side_5 = [part.faces().sort_by_distance(p)[0] for p in [
        (36.58957331, 13.5, -21.125),
    ]]
    chamfer4_edges_6 = [part.edges().sort_by_distance(p)[0] for p in [
        (36.58957331, 0, 21.125),
    ]]
    chamfer4_side_6 = [part.faces().sort_by_distance(p)[0] for p in [
        (36.58957331, 13.5, 21.125),
    ]]
    chamfer4_edges_7 = [part.edges().sort_by_distance(p)[0] for p in [
        (-48.554046939, 0, 0),
    ]]
    chamfer4_side_7 = [part.faces().sort_by_distance(p)[0] for p in [
        (-48.554046939, 13.5, 0),
    ]]
    chamfer4_edges_8 = [part.edges().sort_by_distance(p)[0] for p in [
        (-24.277023469, 0, 42.049038106),
    ]]
    chamfer4_side_8 = [part.faces().sort_by_distance(p)[0] for p in [
        (-24.277023469, 13.5, 42.049038106),
    ]]
    chamfer4_edges_9 = [part.edges().sort_by_distance(p)[0] for p in [
        (24.277023469, 0, 42.049038106),
    ]]
    chamfer4_side_9 = [part.faces().sort_by_distance(p)[0] for p in [
        (24.277023469, 13.5, 42.049038106),
    ]]
    chamfer4_edges_10 = [part.edges().sort_by_distance(p)[0] for p in [
        (48.554046939, 0, 0),
    ]]
    chamfer4_side_10 = [part.faces().sort_by_distance(p)[0] for p in [
        (48.554046939, 13.5, 0),
    ]]
    chamfer4_edges_11 = [part.edges().sort_by_distance(p)[0] for p in [
        (-24.277023469, 0, -42.049038106),
    ]]
    chamfer4_side_11 = [part.faces().sort_by_distance(p)[0] for p in [
        (-24.277023469, 13.5, -42.049038106),
    ]]
    chamfer4_edges_12 = [part.edges().sort_by_distance(p)[0] for p in [
        (24.277023469, 0, -42.049038106),
    ]]
    chamfer4_side_12 = [part.faces().sort_by_distance(p)[0] for p in [
        (24.277023469, 13.5, -42.049038106),
    ]]
    chamfer4 = BRepFilletAPI_MakeChamfer(part.part.solid().wrapped)
    for e in chamfer4_edges_1:
        chamfer4.Add(CHAMFER4_SIZE, CHAMFER4_SIZE2, e.wrapped, chamfer4_side_1[0].wrapped)  # the first distance lies on this face
    for e in chamfer4_edges_2:
        chamfer4.Add(CHAMFER4_SIZE, CHAMFER4_SIZE2, e.wrapped, chamfer4_side_2[0].wrapped)  # the first distance lies on this face
    for e in chamfer4_edges_3:
        chamfer4.Add(CHAMFER4_SIZE, CHAMFER4_SIZE2, e.wrapped, chamfer4_side_3[0].wrapped)  # the first distance lies on this face
    for e in chamfer4_edges_4:
        chamfer4.Add(CHAMFER4_SIZE, CHAMFER4_SIZE2, e.wrapped, chamfer4_side_4[0].wrapped)  # the first distance lies on this face
    for e in chamfer4_edges_5:
        chamfer4.Add(CHAMFER4_SIZE, CHAMFER4_SIZE2, e.wrapped, chamfer4_side_5[0].wrapped)  # the first distance lies on this face
    for e in chamfer4_edges_6:
        chamfer4.Add(CHAMFER4_SIZE, CHAMFER4_SIZE2, e.wrapped, chamfer4_side_6[0].wrapped)  # the first distance lies on this face
    for e in chamfer4_edges_7:
        chamfer4.Add(CHAMFER4_SIZE, CHAMFER4_SIZE2, e.wrapped, chamfer4_side_7[0].wrapped)  # the first distance lies on this face
    for e in chamfer4_edges_8:
        chamfer4.Add(CHAMFER4_SIZE, CHAMFER4_SIZE2, e.wrapped, chamfer4_side_8[0].wrapped)  # the first distance lies on this face
    for e in chamfer4_edges_9:
        chamfer4.Add(CHAMFER4_SIZE, CHAMFER4_SIZE2, e.wrapped, chamfer4_side_9[0].wrapped)  # the first distance lies on this face
    for e in chamfer4_edges_10:
        chamfer4.Add(CHAMFER4_SIZE, CHAMFER4_SIZE2, e.wrapped, chamfer4_side_10[0].wrapped)  # the first distance lies on this face
    for e in chamfer4_edges_11:
        chamfer4.Add(CHAMFER4_SIZE, CHAMFER4_SIZE2, e.wrapped, chamfer4_side_11[0].wrapped)  # the first distance lies on this face
    for e in chamfer4_edges_12:
        chamfer4.Add(CHAMFER4_SIZE, CHAMFER4_SIZE2, e.wrapped, chamfer4_side_12[0].wrapped)  # the first distance lies on this face
    add(Compound.cast(chamfer4.Shape()), mode=Mode.REPLACE)


solid = part.part
